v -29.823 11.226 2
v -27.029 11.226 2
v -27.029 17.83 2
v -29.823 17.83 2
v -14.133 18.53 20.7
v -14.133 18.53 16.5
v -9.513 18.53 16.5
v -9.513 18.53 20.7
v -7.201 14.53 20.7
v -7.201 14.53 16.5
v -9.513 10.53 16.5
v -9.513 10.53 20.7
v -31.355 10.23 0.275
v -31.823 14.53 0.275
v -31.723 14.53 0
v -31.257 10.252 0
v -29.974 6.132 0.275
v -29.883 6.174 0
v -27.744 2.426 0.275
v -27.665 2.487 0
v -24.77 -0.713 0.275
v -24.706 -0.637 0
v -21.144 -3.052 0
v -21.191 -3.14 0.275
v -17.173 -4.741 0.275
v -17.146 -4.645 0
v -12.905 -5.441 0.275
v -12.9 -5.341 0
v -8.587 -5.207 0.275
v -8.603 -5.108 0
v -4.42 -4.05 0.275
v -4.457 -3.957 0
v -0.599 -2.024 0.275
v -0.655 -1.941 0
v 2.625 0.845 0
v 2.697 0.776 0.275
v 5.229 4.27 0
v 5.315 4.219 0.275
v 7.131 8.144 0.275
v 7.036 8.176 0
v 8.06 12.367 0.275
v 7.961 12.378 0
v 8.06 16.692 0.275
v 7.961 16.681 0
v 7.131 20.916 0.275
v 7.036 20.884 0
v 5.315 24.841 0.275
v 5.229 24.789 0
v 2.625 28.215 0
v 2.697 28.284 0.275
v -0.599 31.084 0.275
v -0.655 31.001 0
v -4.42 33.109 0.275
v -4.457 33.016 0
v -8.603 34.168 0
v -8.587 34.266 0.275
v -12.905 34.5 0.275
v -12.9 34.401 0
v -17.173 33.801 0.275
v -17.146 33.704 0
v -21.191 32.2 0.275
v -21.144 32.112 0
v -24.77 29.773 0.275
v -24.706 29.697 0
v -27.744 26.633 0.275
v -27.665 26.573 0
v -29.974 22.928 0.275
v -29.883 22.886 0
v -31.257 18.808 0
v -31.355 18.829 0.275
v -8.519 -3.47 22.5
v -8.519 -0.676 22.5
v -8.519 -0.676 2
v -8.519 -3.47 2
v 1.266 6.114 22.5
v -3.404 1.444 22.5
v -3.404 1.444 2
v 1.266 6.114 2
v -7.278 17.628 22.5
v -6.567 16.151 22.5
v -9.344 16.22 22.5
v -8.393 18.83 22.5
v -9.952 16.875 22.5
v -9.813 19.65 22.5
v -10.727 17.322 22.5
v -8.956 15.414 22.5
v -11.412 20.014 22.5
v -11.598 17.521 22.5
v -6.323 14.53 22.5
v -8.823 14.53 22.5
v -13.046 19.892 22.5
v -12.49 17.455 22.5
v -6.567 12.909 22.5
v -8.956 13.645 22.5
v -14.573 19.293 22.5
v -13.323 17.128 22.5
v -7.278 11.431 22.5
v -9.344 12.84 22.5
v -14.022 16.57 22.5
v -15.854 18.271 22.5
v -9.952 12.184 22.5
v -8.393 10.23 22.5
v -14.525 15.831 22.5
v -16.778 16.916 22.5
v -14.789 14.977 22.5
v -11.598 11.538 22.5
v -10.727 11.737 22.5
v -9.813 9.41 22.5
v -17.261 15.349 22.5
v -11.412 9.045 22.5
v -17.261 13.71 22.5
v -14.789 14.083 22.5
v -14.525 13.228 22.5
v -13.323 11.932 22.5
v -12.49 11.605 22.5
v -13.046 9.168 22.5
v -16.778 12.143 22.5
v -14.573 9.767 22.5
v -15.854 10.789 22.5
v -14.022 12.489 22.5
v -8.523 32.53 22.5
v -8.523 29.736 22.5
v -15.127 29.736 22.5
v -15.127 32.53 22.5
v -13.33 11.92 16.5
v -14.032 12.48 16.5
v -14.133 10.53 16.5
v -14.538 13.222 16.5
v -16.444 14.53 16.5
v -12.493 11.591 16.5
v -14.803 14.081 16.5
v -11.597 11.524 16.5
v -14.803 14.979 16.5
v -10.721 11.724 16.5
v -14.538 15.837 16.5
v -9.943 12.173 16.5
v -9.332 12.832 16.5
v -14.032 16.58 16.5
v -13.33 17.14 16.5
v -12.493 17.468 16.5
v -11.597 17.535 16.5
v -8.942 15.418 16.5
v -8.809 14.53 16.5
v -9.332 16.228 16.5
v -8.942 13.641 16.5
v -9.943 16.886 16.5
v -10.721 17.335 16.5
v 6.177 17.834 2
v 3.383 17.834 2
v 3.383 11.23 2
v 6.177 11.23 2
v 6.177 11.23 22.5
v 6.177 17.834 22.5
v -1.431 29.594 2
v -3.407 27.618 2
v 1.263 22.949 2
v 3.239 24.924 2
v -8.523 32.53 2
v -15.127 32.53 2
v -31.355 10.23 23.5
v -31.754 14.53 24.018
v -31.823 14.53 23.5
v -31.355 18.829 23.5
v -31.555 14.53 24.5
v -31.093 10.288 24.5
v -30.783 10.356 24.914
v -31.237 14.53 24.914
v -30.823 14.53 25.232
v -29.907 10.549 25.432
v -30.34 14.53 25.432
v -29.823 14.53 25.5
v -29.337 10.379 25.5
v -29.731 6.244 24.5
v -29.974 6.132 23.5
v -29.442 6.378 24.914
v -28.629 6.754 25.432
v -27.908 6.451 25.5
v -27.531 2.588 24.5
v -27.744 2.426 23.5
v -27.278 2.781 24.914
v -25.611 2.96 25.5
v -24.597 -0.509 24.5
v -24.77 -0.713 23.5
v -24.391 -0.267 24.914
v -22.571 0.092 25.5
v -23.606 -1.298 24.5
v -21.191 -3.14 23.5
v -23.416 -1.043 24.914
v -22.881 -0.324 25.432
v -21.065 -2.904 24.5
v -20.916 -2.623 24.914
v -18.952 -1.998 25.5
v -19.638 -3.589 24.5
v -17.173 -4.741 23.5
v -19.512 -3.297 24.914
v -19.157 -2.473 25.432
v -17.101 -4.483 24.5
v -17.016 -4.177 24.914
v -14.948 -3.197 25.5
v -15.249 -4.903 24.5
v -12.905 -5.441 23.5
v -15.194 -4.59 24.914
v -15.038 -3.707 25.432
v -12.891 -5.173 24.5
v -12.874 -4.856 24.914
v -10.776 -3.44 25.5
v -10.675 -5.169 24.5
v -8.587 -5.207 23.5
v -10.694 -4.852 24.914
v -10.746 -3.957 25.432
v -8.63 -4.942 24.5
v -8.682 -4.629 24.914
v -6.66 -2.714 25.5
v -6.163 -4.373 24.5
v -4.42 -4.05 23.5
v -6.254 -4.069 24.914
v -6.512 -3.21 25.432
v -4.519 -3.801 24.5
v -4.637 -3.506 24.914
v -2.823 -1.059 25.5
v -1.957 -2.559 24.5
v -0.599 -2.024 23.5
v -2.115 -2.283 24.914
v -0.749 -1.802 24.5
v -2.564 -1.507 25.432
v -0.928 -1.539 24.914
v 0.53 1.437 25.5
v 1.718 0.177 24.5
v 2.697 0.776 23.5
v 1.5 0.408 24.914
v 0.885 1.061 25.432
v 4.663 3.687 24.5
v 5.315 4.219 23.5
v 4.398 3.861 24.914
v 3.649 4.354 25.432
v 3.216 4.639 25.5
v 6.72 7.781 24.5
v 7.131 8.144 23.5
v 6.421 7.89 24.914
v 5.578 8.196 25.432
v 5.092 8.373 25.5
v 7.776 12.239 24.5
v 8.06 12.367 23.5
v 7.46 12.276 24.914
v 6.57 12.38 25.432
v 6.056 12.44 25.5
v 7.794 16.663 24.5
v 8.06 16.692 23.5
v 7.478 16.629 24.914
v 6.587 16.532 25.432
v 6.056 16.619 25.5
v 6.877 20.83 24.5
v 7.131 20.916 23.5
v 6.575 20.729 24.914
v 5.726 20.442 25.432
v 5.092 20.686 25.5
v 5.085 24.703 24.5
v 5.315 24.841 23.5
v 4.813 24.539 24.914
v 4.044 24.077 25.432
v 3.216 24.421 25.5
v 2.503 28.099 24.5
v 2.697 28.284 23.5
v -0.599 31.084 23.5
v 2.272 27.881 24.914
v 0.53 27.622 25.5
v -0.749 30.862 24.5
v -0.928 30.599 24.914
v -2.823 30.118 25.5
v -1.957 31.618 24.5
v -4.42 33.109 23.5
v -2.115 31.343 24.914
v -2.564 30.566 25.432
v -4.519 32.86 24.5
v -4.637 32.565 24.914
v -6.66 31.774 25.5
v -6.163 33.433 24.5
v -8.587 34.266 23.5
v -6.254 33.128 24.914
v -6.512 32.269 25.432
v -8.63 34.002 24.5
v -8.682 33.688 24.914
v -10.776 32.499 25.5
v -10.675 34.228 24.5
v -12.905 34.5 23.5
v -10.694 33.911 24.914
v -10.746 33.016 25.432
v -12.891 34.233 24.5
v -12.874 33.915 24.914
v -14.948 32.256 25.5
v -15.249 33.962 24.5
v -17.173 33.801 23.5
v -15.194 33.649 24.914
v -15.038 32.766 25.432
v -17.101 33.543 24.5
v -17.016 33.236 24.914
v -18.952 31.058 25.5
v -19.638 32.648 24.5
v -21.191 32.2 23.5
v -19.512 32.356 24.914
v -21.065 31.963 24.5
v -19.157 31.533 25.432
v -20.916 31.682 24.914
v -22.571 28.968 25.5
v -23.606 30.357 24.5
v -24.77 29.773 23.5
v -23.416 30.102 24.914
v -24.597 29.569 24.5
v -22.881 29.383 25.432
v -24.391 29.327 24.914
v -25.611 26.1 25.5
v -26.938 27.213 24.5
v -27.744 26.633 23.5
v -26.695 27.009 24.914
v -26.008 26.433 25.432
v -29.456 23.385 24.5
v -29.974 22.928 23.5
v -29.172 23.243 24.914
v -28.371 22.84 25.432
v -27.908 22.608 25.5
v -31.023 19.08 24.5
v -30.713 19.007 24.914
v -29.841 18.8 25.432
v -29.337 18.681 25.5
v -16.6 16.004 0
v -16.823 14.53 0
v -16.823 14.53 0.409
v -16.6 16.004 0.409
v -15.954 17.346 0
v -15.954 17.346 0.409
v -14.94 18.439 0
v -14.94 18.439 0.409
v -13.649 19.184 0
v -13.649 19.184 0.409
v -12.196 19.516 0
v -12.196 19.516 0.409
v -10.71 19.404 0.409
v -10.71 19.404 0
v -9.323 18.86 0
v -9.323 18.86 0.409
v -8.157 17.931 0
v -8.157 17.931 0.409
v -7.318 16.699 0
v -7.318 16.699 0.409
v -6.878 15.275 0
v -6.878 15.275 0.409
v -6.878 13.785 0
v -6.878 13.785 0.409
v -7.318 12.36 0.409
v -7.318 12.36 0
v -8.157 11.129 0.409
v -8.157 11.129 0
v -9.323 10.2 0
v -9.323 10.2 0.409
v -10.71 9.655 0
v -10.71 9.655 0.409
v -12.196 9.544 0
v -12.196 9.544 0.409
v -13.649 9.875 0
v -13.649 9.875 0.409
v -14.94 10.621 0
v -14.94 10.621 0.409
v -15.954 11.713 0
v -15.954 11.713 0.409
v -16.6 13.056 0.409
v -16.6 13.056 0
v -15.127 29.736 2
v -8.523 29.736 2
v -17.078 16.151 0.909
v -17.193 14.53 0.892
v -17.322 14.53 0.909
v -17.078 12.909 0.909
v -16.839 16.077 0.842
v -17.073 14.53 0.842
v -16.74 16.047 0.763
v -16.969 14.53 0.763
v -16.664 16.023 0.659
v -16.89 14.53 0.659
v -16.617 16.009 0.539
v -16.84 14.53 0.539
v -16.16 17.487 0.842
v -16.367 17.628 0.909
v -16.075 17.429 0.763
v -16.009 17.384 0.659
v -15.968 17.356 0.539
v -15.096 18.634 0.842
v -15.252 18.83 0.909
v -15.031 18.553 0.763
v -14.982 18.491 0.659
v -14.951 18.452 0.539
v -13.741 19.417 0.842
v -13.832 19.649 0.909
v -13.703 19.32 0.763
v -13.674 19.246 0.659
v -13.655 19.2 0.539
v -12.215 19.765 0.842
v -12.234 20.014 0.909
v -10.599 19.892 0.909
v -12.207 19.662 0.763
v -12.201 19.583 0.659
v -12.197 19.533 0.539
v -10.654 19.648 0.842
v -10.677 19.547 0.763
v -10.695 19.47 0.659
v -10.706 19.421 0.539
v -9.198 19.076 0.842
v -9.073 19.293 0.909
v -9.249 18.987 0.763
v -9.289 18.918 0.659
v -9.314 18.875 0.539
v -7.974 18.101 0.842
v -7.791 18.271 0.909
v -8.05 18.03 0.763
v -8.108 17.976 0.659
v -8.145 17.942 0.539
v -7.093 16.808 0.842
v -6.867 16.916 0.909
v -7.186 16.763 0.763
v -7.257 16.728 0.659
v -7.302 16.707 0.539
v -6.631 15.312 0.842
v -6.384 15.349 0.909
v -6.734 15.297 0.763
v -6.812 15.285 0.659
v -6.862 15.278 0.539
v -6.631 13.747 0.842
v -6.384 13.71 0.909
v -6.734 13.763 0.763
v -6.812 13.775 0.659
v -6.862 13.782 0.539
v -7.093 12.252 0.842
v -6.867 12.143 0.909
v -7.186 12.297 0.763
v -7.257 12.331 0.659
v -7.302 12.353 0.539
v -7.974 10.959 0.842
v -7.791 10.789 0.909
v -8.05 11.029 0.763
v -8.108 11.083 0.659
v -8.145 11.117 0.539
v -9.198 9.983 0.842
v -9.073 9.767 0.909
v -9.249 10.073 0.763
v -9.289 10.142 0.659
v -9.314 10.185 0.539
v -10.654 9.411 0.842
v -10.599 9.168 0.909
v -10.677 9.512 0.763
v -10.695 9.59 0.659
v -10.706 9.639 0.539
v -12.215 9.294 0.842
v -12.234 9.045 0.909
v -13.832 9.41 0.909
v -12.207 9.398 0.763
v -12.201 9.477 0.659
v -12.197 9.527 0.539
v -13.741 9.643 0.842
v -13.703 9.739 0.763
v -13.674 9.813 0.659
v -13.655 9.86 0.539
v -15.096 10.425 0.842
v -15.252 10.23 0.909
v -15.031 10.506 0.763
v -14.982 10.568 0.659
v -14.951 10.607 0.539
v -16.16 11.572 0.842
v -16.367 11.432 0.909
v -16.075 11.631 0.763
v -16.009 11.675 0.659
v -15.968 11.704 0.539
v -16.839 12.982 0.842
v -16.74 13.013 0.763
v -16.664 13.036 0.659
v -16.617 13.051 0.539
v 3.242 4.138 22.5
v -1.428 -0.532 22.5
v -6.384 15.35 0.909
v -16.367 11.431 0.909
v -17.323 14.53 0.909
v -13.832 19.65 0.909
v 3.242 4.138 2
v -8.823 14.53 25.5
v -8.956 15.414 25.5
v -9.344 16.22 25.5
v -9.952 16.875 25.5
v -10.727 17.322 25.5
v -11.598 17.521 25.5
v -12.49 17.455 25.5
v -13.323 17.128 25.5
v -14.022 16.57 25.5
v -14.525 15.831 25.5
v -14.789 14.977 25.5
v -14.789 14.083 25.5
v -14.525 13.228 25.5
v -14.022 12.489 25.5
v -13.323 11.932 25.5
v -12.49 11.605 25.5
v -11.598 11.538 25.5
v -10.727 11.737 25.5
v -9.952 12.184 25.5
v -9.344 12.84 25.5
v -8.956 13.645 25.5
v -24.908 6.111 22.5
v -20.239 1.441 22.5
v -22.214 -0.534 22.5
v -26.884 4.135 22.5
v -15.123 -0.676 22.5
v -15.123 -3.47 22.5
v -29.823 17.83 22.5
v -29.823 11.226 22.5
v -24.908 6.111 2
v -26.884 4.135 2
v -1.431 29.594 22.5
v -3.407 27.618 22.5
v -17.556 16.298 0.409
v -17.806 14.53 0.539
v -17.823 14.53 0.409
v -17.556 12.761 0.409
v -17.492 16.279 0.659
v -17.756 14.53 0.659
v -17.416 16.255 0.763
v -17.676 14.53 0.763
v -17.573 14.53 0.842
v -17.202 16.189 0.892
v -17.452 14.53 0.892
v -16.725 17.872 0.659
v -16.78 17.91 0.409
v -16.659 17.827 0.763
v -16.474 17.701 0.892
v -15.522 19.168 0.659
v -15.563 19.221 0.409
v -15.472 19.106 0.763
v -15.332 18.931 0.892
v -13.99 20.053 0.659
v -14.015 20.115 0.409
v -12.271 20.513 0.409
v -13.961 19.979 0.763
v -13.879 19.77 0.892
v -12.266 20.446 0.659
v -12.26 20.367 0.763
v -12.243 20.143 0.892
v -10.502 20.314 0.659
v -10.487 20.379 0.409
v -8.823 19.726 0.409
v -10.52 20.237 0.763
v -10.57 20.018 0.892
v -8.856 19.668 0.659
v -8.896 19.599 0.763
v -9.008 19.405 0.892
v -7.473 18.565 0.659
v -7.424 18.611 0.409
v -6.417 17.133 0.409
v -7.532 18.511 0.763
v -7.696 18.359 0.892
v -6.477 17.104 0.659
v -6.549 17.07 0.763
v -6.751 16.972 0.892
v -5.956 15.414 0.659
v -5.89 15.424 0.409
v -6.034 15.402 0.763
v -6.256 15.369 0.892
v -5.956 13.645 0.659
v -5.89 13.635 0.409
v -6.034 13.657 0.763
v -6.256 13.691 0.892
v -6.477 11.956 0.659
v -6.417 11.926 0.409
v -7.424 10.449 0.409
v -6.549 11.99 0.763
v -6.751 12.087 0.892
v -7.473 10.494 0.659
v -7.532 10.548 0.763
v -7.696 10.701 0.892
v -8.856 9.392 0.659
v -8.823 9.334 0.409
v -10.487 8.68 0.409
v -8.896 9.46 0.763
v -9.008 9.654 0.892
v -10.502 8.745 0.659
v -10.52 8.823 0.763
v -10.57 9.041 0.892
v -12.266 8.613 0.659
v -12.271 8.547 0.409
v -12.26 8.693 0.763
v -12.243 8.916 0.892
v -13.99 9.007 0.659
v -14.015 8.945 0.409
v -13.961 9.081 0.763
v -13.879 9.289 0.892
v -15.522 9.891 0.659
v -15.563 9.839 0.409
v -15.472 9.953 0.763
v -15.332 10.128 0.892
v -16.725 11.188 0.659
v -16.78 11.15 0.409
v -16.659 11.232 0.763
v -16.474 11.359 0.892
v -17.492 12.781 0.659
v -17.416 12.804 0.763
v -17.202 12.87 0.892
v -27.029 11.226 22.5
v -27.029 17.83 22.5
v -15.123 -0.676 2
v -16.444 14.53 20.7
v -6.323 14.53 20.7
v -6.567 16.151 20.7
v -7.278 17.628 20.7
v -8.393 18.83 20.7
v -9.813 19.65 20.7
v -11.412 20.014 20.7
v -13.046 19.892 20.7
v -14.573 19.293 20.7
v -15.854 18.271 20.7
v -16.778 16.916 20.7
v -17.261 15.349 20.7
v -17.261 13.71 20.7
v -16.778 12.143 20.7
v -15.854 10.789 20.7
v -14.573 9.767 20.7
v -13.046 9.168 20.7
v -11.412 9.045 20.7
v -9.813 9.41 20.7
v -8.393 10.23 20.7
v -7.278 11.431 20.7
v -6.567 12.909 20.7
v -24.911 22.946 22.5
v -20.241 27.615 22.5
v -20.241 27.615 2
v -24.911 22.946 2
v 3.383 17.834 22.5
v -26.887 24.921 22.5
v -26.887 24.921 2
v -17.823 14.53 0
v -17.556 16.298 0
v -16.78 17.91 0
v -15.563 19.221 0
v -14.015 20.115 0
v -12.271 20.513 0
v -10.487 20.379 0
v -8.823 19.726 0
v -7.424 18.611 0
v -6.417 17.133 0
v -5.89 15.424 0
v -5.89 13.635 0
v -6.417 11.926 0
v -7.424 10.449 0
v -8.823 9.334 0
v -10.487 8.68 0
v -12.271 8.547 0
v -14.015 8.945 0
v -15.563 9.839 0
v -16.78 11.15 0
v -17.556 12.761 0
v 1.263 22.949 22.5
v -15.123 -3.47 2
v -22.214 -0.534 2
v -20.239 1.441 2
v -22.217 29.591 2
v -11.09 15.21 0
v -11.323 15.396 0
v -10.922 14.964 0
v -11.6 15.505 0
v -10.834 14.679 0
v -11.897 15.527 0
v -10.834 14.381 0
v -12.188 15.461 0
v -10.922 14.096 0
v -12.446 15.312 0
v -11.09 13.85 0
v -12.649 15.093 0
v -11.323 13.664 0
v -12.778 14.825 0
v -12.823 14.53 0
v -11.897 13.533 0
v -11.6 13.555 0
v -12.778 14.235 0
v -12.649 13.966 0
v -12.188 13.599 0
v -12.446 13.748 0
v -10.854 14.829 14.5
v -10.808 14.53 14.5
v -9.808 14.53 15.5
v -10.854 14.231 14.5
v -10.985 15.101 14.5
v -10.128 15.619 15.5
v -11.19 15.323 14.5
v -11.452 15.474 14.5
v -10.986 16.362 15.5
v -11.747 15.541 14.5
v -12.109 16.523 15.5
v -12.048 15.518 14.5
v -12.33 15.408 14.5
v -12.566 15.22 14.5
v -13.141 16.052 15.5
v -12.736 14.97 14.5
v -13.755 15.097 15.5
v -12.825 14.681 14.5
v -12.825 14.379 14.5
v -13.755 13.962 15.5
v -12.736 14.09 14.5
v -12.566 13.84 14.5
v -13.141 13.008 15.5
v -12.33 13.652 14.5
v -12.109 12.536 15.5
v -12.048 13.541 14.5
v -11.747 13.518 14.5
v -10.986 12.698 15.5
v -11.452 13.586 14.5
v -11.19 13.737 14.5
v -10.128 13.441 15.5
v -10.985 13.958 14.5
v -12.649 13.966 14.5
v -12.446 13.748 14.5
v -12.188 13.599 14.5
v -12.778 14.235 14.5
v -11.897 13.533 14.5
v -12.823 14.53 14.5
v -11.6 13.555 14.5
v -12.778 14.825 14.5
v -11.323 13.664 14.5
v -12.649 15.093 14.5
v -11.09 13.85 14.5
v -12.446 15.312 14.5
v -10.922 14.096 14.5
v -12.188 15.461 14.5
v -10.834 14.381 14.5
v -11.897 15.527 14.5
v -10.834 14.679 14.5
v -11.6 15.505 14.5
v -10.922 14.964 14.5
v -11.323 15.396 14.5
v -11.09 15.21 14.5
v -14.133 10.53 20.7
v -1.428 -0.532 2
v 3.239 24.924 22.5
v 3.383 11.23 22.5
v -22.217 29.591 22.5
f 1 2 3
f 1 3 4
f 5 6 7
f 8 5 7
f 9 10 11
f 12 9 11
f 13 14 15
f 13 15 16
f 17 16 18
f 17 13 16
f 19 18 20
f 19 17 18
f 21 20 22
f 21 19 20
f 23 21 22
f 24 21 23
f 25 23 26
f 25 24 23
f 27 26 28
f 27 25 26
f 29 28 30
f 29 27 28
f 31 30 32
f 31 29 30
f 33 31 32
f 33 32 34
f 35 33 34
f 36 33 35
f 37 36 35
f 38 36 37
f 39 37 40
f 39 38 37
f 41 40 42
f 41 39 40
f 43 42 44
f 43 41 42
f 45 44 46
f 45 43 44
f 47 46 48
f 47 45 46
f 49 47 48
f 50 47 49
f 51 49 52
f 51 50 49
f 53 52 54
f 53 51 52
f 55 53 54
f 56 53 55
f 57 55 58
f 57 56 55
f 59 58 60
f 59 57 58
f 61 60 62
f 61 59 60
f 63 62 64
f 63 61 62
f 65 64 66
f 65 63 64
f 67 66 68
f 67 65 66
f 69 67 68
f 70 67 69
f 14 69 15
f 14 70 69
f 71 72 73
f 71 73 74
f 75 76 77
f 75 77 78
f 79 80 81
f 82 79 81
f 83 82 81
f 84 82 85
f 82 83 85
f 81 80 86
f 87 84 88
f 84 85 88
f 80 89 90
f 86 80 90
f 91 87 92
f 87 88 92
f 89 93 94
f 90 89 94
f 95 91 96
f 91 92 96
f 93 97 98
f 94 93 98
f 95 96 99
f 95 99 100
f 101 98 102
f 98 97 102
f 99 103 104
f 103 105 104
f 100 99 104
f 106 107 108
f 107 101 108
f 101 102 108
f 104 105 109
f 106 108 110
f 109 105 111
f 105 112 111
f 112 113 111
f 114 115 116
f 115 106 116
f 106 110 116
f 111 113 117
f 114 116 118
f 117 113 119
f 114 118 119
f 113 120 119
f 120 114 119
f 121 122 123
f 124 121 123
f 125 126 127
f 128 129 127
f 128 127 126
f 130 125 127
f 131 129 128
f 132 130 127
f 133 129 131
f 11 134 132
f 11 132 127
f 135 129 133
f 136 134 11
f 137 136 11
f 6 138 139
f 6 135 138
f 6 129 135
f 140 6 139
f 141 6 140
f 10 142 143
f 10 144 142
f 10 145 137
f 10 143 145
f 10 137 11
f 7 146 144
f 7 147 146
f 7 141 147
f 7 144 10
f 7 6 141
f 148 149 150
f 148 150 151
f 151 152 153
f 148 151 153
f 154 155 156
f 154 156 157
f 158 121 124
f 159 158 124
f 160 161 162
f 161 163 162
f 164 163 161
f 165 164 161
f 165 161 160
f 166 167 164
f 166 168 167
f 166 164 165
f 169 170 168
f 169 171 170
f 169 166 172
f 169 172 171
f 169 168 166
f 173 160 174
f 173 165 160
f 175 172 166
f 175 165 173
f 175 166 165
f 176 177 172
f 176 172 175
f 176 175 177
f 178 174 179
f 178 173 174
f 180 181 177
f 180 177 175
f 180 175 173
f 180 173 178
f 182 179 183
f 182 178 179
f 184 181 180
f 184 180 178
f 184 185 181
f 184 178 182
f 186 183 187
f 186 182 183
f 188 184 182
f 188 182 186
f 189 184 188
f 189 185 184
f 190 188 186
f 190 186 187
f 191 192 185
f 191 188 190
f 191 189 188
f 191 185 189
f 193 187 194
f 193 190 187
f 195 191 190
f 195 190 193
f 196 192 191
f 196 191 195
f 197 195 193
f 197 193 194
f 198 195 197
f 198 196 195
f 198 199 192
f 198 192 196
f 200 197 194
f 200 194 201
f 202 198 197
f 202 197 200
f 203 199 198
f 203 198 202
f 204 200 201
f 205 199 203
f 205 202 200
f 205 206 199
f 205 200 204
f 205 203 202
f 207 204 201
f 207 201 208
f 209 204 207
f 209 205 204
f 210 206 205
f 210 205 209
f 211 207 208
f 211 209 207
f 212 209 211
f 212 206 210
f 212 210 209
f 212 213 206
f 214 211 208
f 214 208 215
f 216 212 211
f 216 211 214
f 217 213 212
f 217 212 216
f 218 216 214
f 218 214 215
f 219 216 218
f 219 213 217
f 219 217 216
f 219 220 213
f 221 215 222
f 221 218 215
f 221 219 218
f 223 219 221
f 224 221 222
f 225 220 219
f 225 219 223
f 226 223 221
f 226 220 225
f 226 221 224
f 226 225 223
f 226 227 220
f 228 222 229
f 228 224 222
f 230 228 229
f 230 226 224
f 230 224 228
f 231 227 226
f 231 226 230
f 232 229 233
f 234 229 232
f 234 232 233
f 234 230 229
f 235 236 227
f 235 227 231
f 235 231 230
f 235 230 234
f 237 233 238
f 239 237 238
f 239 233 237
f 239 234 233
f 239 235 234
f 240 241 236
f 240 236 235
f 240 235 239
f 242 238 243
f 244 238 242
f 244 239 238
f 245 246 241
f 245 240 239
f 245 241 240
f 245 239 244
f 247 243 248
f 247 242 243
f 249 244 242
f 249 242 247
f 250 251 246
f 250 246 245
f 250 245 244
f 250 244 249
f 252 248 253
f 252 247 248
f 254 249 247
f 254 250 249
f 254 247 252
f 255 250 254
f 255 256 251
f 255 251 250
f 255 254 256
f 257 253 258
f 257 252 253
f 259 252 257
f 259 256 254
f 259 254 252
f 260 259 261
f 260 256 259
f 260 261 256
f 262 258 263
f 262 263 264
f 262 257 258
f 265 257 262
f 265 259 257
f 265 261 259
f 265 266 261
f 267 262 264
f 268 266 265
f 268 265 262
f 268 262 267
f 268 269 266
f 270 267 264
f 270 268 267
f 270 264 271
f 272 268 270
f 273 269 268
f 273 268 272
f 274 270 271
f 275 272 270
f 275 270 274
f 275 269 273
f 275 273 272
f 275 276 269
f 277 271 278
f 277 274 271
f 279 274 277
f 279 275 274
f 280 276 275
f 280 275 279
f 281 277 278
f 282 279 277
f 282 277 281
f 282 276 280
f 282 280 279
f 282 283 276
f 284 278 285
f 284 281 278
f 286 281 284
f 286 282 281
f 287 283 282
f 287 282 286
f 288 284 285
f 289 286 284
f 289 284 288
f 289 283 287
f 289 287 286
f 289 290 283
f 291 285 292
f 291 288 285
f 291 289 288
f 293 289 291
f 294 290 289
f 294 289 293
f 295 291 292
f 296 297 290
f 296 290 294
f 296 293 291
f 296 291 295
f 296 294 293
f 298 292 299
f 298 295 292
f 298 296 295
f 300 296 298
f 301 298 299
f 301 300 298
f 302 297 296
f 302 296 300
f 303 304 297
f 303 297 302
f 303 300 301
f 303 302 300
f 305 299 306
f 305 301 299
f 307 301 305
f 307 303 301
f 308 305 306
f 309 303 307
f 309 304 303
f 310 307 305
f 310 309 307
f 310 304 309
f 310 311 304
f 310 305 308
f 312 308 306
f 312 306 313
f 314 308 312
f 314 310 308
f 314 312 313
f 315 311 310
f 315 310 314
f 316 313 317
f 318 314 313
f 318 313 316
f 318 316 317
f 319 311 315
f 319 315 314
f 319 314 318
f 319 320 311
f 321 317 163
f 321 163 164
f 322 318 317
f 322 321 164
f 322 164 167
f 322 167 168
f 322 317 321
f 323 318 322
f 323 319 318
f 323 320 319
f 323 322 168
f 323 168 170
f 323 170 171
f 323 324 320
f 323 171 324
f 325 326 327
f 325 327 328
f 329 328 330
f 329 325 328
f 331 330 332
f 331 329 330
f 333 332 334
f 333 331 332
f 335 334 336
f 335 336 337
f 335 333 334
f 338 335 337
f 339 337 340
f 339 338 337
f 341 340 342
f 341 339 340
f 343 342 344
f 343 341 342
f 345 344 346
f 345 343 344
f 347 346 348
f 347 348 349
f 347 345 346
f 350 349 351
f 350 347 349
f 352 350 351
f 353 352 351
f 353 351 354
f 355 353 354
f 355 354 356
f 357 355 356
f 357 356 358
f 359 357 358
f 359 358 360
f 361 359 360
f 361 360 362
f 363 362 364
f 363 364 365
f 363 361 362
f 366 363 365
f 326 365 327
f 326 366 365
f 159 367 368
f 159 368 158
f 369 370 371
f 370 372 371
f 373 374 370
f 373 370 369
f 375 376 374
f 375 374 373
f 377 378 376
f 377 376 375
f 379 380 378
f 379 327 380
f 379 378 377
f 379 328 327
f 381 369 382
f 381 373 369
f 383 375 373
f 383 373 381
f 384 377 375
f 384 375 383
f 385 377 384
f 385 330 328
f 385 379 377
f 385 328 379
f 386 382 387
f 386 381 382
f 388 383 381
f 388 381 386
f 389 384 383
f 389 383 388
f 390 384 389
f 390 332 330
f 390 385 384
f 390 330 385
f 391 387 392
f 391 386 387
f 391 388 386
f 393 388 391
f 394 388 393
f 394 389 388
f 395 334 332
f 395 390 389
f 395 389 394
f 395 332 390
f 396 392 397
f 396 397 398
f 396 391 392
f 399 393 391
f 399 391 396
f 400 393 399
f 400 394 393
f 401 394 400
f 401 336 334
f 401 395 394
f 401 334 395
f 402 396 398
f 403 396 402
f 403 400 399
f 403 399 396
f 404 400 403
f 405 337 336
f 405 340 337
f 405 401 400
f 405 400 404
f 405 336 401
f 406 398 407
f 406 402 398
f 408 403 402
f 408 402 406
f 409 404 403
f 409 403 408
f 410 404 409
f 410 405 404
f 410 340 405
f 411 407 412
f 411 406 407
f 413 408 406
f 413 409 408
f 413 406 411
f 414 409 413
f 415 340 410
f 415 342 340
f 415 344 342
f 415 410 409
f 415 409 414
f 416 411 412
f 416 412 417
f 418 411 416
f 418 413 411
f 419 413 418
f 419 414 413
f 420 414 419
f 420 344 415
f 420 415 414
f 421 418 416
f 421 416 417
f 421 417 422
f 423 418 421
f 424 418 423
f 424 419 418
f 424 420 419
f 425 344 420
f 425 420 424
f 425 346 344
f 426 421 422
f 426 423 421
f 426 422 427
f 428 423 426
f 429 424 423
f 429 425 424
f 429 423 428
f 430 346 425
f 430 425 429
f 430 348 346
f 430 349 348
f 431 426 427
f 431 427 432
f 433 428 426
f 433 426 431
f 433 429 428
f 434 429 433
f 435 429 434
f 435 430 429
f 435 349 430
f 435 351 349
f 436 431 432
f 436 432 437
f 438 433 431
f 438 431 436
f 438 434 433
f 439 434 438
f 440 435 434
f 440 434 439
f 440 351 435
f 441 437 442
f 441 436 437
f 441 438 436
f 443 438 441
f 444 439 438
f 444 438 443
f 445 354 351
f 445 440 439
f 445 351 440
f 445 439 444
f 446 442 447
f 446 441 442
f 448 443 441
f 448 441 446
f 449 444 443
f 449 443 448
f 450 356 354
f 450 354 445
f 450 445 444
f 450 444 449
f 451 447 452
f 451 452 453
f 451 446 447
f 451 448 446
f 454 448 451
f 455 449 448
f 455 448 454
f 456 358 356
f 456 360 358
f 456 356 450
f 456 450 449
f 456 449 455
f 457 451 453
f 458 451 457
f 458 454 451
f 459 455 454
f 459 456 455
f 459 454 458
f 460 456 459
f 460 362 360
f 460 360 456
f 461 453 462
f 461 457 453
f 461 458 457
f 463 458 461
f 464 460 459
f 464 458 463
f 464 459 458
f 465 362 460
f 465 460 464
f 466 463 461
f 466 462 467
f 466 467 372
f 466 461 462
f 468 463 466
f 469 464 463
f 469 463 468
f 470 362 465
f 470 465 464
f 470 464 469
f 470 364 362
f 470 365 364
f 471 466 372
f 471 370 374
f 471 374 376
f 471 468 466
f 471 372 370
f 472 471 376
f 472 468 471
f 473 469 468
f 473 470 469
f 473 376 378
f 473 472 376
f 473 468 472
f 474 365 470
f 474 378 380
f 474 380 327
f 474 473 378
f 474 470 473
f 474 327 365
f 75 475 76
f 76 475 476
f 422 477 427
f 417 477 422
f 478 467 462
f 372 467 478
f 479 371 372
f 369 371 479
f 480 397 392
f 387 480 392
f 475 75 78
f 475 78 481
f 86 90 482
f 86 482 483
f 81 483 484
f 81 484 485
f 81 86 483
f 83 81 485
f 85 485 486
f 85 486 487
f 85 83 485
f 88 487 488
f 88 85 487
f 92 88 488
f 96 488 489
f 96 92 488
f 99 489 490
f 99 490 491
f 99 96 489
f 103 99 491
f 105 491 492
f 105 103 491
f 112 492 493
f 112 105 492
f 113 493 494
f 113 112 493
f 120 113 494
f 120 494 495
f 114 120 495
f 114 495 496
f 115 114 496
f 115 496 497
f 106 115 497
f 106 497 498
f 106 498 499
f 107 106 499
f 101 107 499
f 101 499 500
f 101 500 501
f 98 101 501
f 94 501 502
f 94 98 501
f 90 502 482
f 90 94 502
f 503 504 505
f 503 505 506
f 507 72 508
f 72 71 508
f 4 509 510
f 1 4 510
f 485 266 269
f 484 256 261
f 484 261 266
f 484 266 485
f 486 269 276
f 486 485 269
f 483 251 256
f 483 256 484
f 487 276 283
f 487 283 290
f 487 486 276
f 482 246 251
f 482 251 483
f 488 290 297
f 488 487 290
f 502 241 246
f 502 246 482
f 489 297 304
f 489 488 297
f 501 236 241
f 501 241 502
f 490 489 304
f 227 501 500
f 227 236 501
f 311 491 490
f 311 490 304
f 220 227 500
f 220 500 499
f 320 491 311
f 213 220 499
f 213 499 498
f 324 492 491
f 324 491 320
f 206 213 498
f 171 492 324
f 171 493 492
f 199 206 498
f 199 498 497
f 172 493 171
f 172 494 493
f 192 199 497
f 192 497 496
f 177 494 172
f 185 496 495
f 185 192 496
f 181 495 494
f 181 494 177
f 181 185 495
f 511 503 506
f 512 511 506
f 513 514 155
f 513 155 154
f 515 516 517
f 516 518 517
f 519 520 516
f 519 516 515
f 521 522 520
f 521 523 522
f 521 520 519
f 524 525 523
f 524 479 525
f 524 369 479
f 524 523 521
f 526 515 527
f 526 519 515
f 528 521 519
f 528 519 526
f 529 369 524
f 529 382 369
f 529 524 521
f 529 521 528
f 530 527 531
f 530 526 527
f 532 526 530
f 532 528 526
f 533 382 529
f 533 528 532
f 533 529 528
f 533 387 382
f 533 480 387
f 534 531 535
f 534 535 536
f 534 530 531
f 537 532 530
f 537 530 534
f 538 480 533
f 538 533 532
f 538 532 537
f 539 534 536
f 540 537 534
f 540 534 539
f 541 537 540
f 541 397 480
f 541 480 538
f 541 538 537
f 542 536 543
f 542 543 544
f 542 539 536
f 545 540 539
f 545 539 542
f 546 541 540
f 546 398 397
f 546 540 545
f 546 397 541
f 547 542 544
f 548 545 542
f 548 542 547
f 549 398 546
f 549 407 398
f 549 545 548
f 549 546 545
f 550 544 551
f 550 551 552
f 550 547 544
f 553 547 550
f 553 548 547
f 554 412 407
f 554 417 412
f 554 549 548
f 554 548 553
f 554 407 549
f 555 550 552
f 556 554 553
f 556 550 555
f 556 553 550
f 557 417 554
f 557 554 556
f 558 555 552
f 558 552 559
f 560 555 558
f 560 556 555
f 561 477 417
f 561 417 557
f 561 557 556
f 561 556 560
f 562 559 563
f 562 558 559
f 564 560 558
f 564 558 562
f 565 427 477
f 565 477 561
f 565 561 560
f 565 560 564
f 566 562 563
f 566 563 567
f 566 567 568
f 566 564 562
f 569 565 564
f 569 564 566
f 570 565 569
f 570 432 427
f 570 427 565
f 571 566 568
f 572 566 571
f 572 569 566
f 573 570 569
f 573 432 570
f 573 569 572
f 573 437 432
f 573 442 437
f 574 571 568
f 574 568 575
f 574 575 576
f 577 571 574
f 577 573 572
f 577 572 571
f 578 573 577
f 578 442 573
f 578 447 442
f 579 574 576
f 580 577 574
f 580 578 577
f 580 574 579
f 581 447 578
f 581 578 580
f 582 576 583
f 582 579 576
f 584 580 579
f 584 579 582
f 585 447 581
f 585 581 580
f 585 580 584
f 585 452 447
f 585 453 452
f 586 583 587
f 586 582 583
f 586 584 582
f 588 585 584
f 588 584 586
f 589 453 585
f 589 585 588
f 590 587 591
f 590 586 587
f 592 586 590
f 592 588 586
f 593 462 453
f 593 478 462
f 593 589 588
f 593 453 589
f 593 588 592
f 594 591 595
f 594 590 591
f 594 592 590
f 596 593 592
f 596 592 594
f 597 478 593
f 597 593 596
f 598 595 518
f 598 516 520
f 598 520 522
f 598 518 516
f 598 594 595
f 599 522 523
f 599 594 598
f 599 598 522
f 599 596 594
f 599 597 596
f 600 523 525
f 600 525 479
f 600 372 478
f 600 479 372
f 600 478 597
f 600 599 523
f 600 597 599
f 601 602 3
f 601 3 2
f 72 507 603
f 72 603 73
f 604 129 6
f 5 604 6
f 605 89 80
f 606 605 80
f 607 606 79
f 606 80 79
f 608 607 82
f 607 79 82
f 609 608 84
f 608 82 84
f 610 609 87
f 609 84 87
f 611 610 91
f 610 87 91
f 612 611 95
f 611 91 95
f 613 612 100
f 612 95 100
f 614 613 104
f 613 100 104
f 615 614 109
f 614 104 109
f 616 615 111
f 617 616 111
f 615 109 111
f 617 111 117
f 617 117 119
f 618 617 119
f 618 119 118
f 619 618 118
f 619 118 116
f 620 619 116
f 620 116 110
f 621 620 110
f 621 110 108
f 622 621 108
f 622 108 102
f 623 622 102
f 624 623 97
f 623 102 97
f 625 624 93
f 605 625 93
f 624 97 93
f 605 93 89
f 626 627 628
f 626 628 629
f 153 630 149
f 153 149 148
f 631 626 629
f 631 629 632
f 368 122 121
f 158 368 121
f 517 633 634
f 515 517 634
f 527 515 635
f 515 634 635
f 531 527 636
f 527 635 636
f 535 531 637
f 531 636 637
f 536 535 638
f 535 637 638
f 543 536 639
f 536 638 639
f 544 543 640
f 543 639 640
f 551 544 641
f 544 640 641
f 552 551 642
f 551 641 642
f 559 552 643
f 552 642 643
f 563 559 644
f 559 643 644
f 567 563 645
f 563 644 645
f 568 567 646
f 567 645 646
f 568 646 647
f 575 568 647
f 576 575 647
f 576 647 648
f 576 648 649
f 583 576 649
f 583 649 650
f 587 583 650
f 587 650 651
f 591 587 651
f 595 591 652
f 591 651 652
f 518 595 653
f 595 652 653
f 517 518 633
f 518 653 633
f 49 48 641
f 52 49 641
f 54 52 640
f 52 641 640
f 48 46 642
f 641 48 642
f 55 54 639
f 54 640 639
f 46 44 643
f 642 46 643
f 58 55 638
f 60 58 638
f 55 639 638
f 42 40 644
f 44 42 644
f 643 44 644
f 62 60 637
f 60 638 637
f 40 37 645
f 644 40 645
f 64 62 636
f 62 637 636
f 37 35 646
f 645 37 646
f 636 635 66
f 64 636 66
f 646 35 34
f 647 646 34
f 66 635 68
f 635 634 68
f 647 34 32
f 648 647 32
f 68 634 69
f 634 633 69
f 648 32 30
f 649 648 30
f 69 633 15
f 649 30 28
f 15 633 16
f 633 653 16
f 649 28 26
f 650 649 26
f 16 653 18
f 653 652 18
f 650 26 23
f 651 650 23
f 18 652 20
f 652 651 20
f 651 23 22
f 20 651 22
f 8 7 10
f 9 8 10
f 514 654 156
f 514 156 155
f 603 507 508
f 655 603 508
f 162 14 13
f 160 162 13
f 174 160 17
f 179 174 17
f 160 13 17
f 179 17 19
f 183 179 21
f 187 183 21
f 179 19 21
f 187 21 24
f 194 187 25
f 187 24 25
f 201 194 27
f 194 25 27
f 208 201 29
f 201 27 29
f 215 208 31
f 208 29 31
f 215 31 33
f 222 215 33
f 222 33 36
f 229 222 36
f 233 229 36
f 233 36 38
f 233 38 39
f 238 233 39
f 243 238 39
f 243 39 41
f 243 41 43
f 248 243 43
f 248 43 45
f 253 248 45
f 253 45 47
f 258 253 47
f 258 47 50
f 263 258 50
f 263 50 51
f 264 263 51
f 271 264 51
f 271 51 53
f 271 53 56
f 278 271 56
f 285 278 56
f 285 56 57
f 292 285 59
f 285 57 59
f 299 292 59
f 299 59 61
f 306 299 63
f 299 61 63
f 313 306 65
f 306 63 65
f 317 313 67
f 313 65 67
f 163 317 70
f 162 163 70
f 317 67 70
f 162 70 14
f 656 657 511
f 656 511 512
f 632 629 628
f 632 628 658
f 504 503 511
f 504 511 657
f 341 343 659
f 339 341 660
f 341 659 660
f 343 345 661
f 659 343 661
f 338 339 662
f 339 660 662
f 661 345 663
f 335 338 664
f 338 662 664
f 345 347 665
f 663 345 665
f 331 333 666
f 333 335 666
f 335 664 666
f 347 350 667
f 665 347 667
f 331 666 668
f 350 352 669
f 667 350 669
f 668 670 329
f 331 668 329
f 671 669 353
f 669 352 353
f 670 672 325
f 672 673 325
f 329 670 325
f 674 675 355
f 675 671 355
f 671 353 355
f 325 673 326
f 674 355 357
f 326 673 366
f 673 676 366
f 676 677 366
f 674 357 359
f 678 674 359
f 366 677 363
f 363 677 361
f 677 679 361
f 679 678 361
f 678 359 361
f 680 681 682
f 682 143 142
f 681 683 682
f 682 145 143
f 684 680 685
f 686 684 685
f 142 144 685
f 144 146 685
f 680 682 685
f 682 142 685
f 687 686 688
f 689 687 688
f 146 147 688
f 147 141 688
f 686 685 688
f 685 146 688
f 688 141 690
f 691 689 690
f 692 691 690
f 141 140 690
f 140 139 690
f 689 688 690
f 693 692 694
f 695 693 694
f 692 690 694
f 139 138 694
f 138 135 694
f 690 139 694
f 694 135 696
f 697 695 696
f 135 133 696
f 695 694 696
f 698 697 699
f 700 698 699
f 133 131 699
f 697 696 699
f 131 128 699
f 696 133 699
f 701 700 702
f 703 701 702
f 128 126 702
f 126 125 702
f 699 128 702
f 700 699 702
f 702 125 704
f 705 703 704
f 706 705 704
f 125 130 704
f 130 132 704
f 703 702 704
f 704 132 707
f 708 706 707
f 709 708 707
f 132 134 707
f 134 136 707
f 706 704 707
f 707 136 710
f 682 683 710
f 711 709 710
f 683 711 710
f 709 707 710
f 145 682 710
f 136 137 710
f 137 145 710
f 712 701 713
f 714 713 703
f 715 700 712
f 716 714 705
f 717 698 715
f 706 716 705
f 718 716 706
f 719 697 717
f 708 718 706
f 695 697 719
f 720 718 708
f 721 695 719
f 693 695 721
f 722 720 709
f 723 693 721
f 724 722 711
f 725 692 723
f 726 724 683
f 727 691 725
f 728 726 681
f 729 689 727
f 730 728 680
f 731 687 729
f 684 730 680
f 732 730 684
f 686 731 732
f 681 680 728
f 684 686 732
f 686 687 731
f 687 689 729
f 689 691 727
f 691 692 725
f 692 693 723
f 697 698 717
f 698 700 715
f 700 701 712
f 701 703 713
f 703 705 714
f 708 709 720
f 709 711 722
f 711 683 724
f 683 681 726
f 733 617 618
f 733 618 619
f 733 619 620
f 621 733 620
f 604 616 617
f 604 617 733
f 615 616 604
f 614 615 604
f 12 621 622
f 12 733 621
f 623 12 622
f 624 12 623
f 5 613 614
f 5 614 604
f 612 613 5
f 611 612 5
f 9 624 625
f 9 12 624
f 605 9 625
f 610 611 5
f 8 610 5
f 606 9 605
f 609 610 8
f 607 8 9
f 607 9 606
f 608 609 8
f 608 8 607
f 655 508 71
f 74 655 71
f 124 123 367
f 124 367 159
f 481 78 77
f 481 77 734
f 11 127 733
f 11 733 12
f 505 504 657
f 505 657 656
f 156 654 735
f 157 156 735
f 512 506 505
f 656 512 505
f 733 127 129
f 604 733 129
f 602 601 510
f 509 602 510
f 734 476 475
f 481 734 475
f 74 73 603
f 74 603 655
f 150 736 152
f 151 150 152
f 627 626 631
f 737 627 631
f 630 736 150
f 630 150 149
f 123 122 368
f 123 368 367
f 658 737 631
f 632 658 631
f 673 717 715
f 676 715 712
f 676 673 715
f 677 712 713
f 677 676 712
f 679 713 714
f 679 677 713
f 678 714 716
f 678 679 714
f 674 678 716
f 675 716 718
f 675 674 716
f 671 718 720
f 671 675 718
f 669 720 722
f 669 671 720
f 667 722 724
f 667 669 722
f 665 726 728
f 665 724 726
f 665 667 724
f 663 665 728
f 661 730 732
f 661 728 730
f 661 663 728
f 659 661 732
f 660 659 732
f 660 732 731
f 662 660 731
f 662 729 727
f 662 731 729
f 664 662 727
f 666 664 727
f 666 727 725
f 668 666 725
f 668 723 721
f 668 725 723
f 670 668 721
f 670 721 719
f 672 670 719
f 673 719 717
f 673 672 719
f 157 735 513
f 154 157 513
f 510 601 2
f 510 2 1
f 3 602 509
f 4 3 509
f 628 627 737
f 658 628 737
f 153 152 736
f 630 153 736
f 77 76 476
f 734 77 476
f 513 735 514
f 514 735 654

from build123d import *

# Parameters (mm, degrees)
SKETCH1_R                       = 20
SKETCH1_R_2                     = 1
BOSS_EXTRUDE1_DEPTH             = 22.5
TAP_DRILL_FOR_M5X0_8_TAP1_D     = 4.2
TAP_DRILL_FOR_M5X0_8_TAP1_DEPTH = 5
TAP_DRILL_FOR_M5X0_8_TAP1_TIP   = 1.2618073
SKETCH4_W                       = 2.794
SKETCH4_H                       = 6.604
CUT_EXTRUDE1_DEPTH              = 20.5
CIRPATTERN1_COUNT               = 8
CUT_EXTRUDE3_START              = -6
SKETCH6_W                       = 4.62
SKETCH6_H                       = 8
SKETCH6_R                       = 2.1
CUT_EXTRUDE3_DEPTH              = 6
SKETCH7_R                       = 5.5
CUT_EXTRUDE4_DEPTH              = 1.8
SKETCH9_R                       = 3.014010562
CUT_EXTRUDE5_DEPTH              = 2
CHAMFER1_SIZE                   = 2
SKETCH8_R                       = 20
SKETCH8_R_2                     = 3
BOSS_EXTRUDE2_DEPTH             = 3
SKETCH5_R                       = 6
SKETCH5_R_2                     = 5
CUT_EXTRUDE2_DEPTH              = 0.909090909
FILLET3_R                       = 0.5
FILLET4_R                       = 2
CHAMFER2_SIZE                   = 0.1
CHAMFER2_SIZE2                  = 0.274747742


with BuildPart() as part:
    # Sketch1 → Boss-Extrude1 (new body)
    with BuildSketch(Plane.XY):
        with Locations(Location((-11.822558412, 14.529752947, 0), (0, 0, 180))):
            Circle(SKETCH1_R)
        with Locations(Location((-11.822558412, 14.529752947, 0), (0, 0, 180))):
            Circle(SKETCH1_R_2, mode=Mode.SUBTRACT)
    extrude(amount=BOSS_EXTRUDE1_DEPTH)

    # Tap Drill for M5x0.8 Tap1
    with Locations(Plane.XY.offset(22.5)):
        with Locations((-11.822558412, 14.529752947)):
            Hole(TAP_DRILL_FOR_M5X0_8_TAP1_D / 2, depth=TAP_DRILL_FOR_M5X0_8_TAP1_DEPTH)
            with Locations((0, 0, -(TAP_DRILL_FOR_M5X0_8_TAP1_DEPTH + TAP_DRILL_FOR_M5X0_8_TAP1_TIP / 2))):  # 118° drill point
                Cone(0, TAP_DRILL_FOR_M5X0_8_TAP1_D / 2, TAP_DRILL_FOR_M5X0_8_TAP1_TIP, mode=Mode.SUBTRACT)

    # Sketch4 → Cut-Extrude1 (cut)
    with BuildSketch(Plane.XY.offset(22.5)):
        with Locations((4.780441588, 14.531752947)):
            Rectangle(SKETCH4_W, SKETCH4_H)
    cut_extrude1 = extrude(amount=-CUT_EXTRUDE1_DEPTH, mode=Mode.SUBTRACT)

    # CirPattern1: Cut-Extrude1 ×8 about axis
    cirpattern1_axis = Axis((-11.822558412, 14.529752947, 0), (0, 0, 1))
    for i in range(1, CIRPATTERN1_COUNT):
        add(cut_extrude1.rotate(cirpattern1_axis, i * 360 / CIRPATTERN1_COUNT), mode=Mode.SUBTRACT)

    # Sketch6 → Cut-Extrude3 (cut)
    # profile 1 of 4: a face of its own
    with BuildSketch(Plane.XY.offset(22.5).offset(CUT_EXTRUDE3_START)):
        Polygon((-16.444354251, 14.529752947), (-14.132558412, 18.529752947), (-14.132558412, 10.529752947), align=None)
    # profile 2 of 4: a face of its own
    with BuildSketch(Plane.XY.offset(22.5).offset(CUT_EXTRUDE3_START)):
        Polygon((-7.200762573, 14.529752947), (-9.512558412, 10.529752947), (-9.512558412, 18.529752947), align=None)
    # profile 3 of 4: a face of its own
    with BuildSketch(Plane.XY.offset(22.5).offset(CUT_EXTRUDE3_START)):
        with Locations((-11.822558412, 14.529752947)):
            Rectangle(SKETCH6_W, SKETCH6_H)
        with Locations((-11.822558412, 14.529752947)):
            Circle(SKETCH6_R, mode=Mode.SUBTRACT)
    # profile 4 of 4: a face of its own
    with BuildSketch(Plane.XY.offset(22.5).offset(CUT_EXTRUDE3_START)):
        with Locations((-11.822558412, 14.529752947)):
            Circle(SKETCH6_R)
    extrude(amount=CUT_EXTRUDE3_DEPTH, mode=Mode.SUBTRACT)

    # Sketch7 → Cut-Extrude4 (cut)
    with BuildSketch(Plane.XY.offset(22.5)):
        with Locations((-11.822558412, 14.529752947)):
            Circle(SKETCH7_R)
    extrude(amount=-CUT_EXTRUDE4_DEPTH, mode=Mode.SUBTRACT)

    # Sketch9 → Cut-Extrude5 (cut)
    with BuildSketch(Plane.XY.offset(16.5)):
        with Locations((-11.822558412, 14.529752947)):
            Circle(SKETCH9_R)
    extrude(amount=-CUT_EXTRUDE5_DEPTH, mode=Mode.SUBTRACT)

    # Chamfer1
    chamfer1_edges = [part.edges().sort_by_distance(p)[0] for p in [
        (-14.836568974, 14.529752947, 14.5),
    ]]
    chamfer(chamfer1_edges, length=CHAMFER1_SIZE - 0.0001)  # a hair under: the kernel refuses the full size

    # Sketch8 → Boss-Extrude2 (add)
    with BuildSketch(Plane.XY.offset(22.5)):
        with Locations(Location((-11.822558412, 14.529752947, 0), (0, 0, 180))):
            Circle(SKETCH8_R)
        with Locations((-11.822558412, 14.529752947)):
            Circle(SKETCH8_R_2, mode=Mode.SUBTRACT)
    extrude(amount=BOSS_EXTRUDE2_DEPTH)

    # Sketch5 → Cut-Extrude2 (cut)
    with BuildSketch(Plane(origin=(0, 0, 0), x_dir=(-1, 0, 0), z_dir=(0, 0, -1))):
        with Locations((11.822558412, 14.529752947)):
            Circle(SKETCH5_R)
        with Locations((11.822558412, 14.529752947)):
            Circle(SKETCH5_R_2, mode=Mode.SUBTRACT)
    extrude(amount=-CUT_EXTRUDE2_DEPTH, mode=Mode.SUBTRACT)

    # Fillet3
    fillet3_edges = [part.edges().sort_by_distance(p)[0] for p in [
        (-5.822558412, 14.529752947, 0.909090909),
        (-6.822558412, 14.529752947, 0.909090909),
    ]]
    fillet(fillet3_edges, radius=FILLET3_R - 0.0001)  # a hair under: the kernel refuses the full size

    # Fillet4
    fillet4_edges = [part.edges().sort_by_distance(p)[0] for p in [
        (8.177441588, 14.529752947, 25.5),
    ]]
    fillet(fillet4_edges, radius=FILLET4_R)

    # Chamfer2
    chamfer2_edges = [part.edges().sort_by_distance(p)[0] for p in [
        (8.177441588, 14.529752947, 0),
    ]]
    chamfer2_side = [part.faces().sort_by_distance(p)[0] for p in [
        (7.611756163, 14.529752947, 0),
    ]]
    chamfer(chamfer2_edges, length=CHAMFER2_SIZE, length2=CHAMFER2_SIZE2, reference=chamfer2_side[0])


solid = part.part
